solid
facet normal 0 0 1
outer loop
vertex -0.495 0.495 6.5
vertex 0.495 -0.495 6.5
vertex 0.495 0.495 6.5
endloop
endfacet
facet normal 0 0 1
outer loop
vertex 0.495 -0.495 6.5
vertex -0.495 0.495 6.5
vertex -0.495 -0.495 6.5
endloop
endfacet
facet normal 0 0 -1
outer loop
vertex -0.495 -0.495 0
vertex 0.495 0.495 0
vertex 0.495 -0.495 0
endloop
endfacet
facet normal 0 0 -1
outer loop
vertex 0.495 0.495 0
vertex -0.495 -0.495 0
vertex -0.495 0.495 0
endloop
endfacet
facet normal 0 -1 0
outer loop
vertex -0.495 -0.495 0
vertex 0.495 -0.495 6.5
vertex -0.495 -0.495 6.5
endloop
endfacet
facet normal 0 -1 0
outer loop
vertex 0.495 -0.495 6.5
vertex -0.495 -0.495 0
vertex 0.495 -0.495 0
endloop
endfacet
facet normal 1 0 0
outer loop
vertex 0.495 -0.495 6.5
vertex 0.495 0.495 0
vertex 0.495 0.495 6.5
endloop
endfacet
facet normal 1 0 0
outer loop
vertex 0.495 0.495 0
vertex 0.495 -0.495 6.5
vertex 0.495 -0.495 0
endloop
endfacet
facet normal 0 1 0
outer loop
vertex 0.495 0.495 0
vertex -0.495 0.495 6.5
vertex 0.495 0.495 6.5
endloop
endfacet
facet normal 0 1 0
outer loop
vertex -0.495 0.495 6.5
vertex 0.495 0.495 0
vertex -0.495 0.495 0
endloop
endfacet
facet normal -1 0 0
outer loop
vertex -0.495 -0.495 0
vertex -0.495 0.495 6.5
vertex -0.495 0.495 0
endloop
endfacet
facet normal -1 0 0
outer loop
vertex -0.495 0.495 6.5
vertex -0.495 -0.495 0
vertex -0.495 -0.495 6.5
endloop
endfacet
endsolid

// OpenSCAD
use <lib.scad>

hd = 36;
ld = 16;
vld = 8;

module cowling() {
	difference() {
		hull() {
			cyl(0.5,0.5,0.5);
			translate([0,0,0.5]) torus(0.1,0.25);
			translate([0,0,-0.5]) torus(0.1,0.25);
		}
		cyl(0.3,0.3,2.0);
	}
}

module cowlingHD() {
	cowling($fn=hd);
}

module cowlingLD() {
	cowling($fn=ld);
}

module fan(degrees) {
	translate([0,0,0.45]) union() {
		for (i = [0:degrees:360]) {
			rotate([0,0,i]) translate([0,0.15,0]) rotate([0,20,0]) box([0.01,0.3,0.1]);
		}
		hull() {
			translate([0,0,0.05]) sphere(0.1);
			translate([0,0,-0.7]) cyl(0.1,0.1,0.1);
		}
	}
}

module fanHD() {
	fan(10, $fn=hd/2);
}

module fanLD() {
	fan(30, $fn=ld/2);
}

module frame(h) {
	difference() {
		translate([0,0,(h-0.5)/2]) box([0.99, 0.99, h-0.5]);
		translate([0,0,1.1]) box([2, 0.85, 1.8]);
		translate([0,0,1.1]) box([0.85, 2, 1.8]);

		translate([0,0,(h-2.9)/2+2.2]) box([2, 0.85, h-2.9]);
		translate([0,0,(h-2.9)/2+2.2]) box([0.85, 2, h-2.9]);
		translate([0,0,(h-2)/2+1.8]) cyl(0.4,0.4,h-2,$fn=32);
	}
}

module frameHD(h) {
	minkowskiOutsideRound(0.01,$fn=8)
	frame(h, $fn=hd);
}

module frameLD() {
	frame(h, $fn=ld);
}

module frameVLD(h) {
	translate([0,0,(h+0.5)/2]) box([0.99,0.99,h+0.5]);
}

module frameAlt(h) {
	difference() {
		translate([0,0,(h-0.5)/2]) box([0.99, 0.99, h-0.5]);
	}
}

module frameAltHD(h) {
	minkowskiOutsideRound(0.01,$fn=8)
	frameAlt(h, $fn=hd);
}

module frameAltLD(h) {
	frameAlt(h, $fn=ld);
}

module frameAltVLD(h) {
	frameAlt(h, $fn=vld);
}

h=3;
//translate([0,0,h]) cowlingHD();
//translate([0,0,h]) fanHD();
//frameHD(h);
//frameAltHD(7);

//cowlingHD();
//fanHD();
//frameHD(h);
//frameAltLD(7);

//cowlingLD();
//fanLD();
//frameLD();

//frameVLD(7);
frameAltVLD(7);

module conduitGlassHD() {
	rotate([90,90,0]) difference() {
		cyl(0.4,0.4,1.0,$fn=hd);
		cyl(0.35,0.35,1.1,$fn=hd);
	}
}

module conduitGlassLD() {
	rotate([90,90,0]) difference() {
		cyl(0.4,0.4,1.0,$fn=ld);
		cyl(0.35,0.35,1.1,$fn=ld);
	}
}

//conduitGlassLD();

module conduitRingHD() {
	rotate([90,90,0]) difference() {
		cyl(0.425,0.425,0.1,$fn=16);
		cyl(0.4,0.4,1.1,$fn=16);
	}
}

module conduitRingLD() {
	rotate([90,90,0]) difference() {
		cyl(0.425,0.425,0.1,$fn=8);
		cyl(0.4,0.4,1.1,$fn=8);
	}
}

//conduitRingLD();
